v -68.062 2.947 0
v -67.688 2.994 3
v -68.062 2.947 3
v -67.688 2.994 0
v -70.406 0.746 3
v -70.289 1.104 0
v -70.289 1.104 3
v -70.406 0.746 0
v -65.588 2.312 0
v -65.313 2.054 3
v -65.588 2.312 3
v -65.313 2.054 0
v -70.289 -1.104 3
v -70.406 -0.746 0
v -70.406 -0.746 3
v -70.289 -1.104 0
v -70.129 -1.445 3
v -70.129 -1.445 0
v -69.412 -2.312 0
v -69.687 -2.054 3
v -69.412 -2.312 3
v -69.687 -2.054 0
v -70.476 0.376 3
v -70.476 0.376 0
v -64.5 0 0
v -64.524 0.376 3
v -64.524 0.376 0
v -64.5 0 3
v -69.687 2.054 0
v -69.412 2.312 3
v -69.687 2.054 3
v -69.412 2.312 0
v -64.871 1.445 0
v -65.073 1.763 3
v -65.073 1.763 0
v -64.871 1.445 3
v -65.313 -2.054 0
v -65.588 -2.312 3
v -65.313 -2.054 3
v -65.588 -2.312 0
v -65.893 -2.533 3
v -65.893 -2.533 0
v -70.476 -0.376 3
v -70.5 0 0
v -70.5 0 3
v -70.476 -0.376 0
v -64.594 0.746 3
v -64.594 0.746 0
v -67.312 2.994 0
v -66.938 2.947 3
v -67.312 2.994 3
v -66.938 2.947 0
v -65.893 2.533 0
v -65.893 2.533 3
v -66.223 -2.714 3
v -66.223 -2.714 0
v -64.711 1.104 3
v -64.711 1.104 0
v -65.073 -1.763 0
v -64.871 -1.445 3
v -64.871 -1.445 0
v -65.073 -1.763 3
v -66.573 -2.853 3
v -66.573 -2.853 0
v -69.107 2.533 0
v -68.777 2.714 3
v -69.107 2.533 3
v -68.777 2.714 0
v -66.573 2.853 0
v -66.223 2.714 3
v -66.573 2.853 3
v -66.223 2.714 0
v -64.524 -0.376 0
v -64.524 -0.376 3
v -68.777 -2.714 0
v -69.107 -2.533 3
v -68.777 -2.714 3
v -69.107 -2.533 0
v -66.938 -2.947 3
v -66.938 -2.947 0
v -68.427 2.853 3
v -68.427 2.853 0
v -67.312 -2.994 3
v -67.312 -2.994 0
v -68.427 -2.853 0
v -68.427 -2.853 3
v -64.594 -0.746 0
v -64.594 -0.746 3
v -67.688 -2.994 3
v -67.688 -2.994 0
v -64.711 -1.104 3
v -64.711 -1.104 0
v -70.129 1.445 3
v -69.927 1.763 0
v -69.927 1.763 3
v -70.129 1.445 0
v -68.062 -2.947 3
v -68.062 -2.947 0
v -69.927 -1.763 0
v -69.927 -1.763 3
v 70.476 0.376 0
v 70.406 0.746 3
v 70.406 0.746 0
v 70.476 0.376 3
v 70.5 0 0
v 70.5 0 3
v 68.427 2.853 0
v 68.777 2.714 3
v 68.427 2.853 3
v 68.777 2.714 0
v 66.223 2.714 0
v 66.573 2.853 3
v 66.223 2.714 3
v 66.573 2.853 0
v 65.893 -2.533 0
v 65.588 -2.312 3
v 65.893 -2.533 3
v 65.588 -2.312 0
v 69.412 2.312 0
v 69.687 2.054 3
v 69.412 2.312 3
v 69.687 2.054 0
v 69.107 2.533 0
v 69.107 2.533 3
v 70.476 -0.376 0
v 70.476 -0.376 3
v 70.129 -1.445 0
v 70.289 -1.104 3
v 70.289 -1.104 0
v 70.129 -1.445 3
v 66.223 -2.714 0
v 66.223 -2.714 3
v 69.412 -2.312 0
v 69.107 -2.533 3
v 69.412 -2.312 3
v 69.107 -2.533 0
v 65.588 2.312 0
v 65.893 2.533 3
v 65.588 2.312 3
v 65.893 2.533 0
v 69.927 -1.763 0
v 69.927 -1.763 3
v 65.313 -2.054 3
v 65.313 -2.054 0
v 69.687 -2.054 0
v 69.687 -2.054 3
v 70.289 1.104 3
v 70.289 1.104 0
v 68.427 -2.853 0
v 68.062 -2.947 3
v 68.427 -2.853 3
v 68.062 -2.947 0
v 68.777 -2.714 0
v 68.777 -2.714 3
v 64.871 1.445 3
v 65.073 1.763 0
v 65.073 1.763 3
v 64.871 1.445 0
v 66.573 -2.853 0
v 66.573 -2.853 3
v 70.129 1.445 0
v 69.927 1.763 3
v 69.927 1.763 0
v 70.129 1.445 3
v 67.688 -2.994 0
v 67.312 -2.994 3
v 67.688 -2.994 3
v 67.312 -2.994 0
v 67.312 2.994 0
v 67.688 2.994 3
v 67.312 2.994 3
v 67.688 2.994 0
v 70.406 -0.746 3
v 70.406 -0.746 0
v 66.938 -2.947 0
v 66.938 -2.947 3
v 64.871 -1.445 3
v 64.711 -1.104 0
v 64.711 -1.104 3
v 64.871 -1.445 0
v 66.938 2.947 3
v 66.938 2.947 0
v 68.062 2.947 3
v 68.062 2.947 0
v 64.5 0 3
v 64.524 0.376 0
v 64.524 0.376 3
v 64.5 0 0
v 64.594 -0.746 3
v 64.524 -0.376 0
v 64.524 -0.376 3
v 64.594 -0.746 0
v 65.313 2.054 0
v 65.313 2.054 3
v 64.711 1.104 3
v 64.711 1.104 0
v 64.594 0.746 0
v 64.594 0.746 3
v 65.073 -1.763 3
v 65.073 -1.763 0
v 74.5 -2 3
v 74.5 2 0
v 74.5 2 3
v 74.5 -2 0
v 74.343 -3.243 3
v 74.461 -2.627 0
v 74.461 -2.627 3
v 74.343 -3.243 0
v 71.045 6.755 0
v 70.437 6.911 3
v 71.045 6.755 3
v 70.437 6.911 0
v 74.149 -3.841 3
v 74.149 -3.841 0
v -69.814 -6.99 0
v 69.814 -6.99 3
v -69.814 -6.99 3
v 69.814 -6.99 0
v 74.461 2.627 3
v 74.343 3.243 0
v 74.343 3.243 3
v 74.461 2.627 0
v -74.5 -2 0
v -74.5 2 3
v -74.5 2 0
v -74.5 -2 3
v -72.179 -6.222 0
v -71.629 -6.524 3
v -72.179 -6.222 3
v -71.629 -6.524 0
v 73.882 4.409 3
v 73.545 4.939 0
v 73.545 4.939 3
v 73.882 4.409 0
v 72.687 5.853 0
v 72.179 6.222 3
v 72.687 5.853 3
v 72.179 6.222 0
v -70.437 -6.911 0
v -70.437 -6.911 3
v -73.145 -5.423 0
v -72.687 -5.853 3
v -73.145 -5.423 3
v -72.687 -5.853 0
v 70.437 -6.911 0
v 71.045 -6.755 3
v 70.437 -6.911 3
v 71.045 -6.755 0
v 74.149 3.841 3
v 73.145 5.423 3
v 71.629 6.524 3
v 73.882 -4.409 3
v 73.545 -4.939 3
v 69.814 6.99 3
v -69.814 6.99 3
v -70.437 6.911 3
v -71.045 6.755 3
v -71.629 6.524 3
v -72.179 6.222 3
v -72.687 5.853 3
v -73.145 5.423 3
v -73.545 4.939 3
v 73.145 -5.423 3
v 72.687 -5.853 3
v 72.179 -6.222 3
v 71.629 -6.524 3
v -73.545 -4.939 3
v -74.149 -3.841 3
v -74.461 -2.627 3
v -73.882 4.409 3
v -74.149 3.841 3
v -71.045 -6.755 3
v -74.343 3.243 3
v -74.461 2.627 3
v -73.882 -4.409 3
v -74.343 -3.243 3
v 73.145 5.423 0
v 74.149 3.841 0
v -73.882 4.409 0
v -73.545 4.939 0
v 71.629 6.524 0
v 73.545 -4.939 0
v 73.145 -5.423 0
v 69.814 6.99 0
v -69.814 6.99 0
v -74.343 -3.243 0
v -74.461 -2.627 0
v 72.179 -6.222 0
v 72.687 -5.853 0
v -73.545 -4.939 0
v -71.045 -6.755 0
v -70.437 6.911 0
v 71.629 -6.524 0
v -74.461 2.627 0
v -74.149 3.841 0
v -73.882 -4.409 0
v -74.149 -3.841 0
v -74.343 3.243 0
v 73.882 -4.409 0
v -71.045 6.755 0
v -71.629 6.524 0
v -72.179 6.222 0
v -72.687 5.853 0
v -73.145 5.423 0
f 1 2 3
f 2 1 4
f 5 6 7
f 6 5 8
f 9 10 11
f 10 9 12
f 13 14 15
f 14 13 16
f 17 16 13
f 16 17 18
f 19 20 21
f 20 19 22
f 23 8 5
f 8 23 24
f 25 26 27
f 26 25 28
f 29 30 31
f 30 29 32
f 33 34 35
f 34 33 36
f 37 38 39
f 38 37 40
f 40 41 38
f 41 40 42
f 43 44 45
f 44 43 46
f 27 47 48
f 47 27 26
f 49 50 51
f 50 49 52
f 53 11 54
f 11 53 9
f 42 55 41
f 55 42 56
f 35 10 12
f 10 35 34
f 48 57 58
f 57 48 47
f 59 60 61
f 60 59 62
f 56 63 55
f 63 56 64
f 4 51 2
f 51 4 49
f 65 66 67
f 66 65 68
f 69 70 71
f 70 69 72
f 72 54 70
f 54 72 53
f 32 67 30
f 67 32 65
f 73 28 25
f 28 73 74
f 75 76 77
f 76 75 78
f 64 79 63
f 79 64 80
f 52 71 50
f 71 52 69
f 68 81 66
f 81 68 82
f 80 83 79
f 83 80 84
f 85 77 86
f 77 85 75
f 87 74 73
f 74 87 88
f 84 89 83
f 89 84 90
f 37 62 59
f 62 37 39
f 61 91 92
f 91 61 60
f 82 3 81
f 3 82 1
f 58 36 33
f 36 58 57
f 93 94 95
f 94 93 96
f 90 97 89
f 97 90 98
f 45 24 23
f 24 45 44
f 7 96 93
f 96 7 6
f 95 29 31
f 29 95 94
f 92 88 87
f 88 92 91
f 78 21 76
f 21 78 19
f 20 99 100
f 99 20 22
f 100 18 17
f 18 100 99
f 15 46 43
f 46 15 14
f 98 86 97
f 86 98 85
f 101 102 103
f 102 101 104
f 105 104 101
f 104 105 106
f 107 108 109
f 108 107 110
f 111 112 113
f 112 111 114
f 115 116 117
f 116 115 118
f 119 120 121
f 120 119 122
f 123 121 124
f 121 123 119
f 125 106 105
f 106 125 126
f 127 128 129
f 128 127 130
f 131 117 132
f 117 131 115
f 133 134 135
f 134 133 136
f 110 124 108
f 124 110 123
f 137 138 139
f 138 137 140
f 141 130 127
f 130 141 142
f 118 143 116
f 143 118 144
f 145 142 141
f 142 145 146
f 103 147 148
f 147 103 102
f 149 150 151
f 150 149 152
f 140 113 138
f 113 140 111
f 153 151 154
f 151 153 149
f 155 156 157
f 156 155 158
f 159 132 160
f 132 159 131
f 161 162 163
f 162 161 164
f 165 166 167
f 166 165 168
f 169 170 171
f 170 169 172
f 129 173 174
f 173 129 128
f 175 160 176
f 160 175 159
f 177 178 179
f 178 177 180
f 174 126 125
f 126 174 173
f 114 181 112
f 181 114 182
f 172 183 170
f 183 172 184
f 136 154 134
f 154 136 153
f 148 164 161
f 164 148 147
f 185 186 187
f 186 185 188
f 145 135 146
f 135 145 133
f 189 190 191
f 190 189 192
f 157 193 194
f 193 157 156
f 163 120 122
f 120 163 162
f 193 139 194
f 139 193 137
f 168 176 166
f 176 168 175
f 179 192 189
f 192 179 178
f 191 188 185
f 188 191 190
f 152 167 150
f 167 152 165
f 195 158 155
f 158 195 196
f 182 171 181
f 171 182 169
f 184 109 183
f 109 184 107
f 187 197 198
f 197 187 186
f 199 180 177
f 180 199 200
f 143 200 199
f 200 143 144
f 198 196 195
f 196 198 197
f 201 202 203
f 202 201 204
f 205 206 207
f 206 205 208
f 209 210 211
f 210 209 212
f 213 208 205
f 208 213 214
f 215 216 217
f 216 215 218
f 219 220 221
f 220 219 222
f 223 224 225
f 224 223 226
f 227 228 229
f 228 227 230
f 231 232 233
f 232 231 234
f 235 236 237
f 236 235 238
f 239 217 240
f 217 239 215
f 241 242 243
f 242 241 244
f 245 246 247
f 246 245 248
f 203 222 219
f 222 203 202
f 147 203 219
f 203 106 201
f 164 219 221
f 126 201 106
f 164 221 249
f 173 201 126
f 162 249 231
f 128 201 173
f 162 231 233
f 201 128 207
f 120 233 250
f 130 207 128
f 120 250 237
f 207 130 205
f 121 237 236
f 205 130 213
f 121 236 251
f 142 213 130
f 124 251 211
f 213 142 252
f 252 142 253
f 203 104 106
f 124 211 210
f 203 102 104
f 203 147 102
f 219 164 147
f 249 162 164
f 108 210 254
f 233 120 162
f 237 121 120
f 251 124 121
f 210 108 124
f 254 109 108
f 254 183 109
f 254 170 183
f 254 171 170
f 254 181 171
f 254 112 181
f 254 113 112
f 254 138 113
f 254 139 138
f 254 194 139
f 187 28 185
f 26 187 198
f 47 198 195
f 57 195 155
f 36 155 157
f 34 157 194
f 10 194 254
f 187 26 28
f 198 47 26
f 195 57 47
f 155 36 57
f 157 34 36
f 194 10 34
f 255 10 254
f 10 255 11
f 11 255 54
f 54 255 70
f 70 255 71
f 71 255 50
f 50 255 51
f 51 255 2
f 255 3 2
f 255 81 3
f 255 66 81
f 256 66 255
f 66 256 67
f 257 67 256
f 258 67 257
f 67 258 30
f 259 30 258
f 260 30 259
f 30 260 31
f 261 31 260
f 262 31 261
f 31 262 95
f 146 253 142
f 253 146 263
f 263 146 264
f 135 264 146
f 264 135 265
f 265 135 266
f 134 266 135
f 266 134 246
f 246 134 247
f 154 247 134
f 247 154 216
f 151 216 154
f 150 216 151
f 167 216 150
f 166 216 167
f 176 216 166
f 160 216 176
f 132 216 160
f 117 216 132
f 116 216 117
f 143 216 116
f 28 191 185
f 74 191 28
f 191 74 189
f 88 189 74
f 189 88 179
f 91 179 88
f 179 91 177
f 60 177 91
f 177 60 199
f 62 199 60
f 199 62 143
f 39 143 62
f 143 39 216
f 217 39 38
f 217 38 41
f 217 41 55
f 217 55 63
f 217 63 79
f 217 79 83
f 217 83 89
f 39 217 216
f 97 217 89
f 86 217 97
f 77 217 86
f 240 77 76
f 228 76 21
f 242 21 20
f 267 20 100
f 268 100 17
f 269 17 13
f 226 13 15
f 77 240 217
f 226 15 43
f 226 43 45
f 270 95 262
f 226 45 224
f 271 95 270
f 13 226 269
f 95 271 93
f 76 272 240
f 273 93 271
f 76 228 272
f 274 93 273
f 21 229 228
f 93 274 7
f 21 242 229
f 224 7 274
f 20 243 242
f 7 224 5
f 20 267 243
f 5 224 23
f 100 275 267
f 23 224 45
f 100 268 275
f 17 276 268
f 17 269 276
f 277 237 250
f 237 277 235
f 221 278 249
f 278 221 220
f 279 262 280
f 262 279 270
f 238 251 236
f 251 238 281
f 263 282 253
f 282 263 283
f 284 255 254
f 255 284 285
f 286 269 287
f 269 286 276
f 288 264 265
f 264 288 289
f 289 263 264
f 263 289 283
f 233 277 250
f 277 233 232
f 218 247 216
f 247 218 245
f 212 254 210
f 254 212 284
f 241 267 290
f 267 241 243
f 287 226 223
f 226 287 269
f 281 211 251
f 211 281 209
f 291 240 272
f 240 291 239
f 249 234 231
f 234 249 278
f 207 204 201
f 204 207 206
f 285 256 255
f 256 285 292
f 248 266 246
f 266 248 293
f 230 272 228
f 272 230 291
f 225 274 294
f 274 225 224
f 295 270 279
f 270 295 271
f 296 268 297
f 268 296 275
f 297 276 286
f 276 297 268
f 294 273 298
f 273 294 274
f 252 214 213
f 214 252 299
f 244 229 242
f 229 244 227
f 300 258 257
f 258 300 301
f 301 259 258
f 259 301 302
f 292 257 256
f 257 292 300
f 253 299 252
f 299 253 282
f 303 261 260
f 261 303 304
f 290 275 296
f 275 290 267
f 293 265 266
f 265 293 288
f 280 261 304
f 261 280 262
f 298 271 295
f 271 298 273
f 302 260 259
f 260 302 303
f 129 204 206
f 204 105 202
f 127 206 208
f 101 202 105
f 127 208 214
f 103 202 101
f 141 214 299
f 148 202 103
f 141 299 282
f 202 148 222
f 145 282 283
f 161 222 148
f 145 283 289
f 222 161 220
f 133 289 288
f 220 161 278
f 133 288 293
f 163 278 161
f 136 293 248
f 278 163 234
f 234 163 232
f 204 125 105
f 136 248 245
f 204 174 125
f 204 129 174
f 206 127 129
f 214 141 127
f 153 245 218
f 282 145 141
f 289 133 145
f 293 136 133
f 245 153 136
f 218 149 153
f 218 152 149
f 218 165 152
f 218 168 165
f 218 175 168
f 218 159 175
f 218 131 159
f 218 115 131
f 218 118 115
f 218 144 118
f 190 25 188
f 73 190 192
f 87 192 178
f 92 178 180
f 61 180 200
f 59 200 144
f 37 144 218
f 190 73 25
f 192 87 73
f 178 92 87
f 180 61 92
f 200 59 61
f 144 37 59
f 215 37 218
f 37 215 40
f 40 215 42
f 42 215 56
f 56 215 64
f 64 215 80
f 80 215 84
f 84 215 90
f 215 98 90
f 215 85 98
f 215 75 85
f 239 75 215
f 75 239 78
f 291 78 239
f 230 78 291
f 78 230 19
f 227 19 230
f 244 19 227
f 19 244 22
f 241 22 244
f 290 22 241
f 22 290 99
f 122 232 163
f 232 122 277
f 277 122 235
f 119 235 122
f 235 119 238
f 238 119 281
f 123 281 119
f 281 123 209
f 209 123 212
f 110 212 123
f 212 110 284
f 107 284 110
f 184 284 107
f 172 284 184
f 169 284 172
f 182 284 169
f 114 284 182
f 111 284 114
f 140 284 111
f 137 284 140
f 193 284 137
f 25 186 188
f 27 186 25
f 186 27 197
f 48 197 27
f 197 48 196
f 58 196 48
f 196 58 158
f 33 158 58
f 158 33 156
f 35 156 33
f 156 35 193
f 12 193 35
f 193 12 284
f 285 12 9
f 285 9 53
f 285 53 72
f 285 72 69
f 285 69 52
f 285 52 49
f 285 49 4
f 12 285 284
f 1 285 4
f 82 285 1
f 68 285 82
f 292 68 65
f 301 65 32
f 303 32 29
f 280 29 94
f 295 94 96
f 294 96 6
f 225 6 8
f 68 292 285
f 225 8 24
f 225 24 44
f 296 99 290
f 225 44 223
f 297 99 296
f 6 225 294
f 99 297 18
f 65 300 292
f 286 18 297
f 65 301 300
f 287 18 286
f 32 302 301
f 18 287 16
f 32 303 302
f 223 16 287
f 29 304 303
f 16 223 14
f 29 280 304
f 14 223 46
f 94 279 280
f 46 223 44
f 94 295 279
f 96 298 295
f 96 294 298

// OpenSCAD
$fn = 50;


difference() {
	union() {
		hull() {
			translate(v = [-69.5000000000, 2.0000000000, 0]) {
				cylinder(h = 3, r = 5);
			}
			translate(v = [69.5000000000, 2.0000000000, 0]) {
				cylinder(h = 3, r = 5);
			}
			translate(v = [-69.5000000000, -2.0000000000, 0]) {
				cylinder(h = 3, r = 5);
			}
			translate(v = [69.5000000000, -2.0000000000, 0]) {
				cylinder(h = 3, r = 5);
			}
		}
	}
	union() {
		translate(v = [-67.5000000000, 0.0000000000, -100.0000000000]) {
			cylinder(h = 200, r = 3.0000000000);
		}
		translate(v = [-67.5000000000, 0.0000000000, -100.0000000000]) {
			cylinder(h = 200, r = 3.0000000000);
		}
		translate(v = [67.5000000000, 0.0000000000, -100.0000000000]) {
			cylinder(h = 200, r = 3.0000000000);
		}
		translate(v = [67.5000000000, 0.0000000000, -100.0000000000]) {
			cylinder(h = 200, r = 3.0000000000);
		}
	}
}
